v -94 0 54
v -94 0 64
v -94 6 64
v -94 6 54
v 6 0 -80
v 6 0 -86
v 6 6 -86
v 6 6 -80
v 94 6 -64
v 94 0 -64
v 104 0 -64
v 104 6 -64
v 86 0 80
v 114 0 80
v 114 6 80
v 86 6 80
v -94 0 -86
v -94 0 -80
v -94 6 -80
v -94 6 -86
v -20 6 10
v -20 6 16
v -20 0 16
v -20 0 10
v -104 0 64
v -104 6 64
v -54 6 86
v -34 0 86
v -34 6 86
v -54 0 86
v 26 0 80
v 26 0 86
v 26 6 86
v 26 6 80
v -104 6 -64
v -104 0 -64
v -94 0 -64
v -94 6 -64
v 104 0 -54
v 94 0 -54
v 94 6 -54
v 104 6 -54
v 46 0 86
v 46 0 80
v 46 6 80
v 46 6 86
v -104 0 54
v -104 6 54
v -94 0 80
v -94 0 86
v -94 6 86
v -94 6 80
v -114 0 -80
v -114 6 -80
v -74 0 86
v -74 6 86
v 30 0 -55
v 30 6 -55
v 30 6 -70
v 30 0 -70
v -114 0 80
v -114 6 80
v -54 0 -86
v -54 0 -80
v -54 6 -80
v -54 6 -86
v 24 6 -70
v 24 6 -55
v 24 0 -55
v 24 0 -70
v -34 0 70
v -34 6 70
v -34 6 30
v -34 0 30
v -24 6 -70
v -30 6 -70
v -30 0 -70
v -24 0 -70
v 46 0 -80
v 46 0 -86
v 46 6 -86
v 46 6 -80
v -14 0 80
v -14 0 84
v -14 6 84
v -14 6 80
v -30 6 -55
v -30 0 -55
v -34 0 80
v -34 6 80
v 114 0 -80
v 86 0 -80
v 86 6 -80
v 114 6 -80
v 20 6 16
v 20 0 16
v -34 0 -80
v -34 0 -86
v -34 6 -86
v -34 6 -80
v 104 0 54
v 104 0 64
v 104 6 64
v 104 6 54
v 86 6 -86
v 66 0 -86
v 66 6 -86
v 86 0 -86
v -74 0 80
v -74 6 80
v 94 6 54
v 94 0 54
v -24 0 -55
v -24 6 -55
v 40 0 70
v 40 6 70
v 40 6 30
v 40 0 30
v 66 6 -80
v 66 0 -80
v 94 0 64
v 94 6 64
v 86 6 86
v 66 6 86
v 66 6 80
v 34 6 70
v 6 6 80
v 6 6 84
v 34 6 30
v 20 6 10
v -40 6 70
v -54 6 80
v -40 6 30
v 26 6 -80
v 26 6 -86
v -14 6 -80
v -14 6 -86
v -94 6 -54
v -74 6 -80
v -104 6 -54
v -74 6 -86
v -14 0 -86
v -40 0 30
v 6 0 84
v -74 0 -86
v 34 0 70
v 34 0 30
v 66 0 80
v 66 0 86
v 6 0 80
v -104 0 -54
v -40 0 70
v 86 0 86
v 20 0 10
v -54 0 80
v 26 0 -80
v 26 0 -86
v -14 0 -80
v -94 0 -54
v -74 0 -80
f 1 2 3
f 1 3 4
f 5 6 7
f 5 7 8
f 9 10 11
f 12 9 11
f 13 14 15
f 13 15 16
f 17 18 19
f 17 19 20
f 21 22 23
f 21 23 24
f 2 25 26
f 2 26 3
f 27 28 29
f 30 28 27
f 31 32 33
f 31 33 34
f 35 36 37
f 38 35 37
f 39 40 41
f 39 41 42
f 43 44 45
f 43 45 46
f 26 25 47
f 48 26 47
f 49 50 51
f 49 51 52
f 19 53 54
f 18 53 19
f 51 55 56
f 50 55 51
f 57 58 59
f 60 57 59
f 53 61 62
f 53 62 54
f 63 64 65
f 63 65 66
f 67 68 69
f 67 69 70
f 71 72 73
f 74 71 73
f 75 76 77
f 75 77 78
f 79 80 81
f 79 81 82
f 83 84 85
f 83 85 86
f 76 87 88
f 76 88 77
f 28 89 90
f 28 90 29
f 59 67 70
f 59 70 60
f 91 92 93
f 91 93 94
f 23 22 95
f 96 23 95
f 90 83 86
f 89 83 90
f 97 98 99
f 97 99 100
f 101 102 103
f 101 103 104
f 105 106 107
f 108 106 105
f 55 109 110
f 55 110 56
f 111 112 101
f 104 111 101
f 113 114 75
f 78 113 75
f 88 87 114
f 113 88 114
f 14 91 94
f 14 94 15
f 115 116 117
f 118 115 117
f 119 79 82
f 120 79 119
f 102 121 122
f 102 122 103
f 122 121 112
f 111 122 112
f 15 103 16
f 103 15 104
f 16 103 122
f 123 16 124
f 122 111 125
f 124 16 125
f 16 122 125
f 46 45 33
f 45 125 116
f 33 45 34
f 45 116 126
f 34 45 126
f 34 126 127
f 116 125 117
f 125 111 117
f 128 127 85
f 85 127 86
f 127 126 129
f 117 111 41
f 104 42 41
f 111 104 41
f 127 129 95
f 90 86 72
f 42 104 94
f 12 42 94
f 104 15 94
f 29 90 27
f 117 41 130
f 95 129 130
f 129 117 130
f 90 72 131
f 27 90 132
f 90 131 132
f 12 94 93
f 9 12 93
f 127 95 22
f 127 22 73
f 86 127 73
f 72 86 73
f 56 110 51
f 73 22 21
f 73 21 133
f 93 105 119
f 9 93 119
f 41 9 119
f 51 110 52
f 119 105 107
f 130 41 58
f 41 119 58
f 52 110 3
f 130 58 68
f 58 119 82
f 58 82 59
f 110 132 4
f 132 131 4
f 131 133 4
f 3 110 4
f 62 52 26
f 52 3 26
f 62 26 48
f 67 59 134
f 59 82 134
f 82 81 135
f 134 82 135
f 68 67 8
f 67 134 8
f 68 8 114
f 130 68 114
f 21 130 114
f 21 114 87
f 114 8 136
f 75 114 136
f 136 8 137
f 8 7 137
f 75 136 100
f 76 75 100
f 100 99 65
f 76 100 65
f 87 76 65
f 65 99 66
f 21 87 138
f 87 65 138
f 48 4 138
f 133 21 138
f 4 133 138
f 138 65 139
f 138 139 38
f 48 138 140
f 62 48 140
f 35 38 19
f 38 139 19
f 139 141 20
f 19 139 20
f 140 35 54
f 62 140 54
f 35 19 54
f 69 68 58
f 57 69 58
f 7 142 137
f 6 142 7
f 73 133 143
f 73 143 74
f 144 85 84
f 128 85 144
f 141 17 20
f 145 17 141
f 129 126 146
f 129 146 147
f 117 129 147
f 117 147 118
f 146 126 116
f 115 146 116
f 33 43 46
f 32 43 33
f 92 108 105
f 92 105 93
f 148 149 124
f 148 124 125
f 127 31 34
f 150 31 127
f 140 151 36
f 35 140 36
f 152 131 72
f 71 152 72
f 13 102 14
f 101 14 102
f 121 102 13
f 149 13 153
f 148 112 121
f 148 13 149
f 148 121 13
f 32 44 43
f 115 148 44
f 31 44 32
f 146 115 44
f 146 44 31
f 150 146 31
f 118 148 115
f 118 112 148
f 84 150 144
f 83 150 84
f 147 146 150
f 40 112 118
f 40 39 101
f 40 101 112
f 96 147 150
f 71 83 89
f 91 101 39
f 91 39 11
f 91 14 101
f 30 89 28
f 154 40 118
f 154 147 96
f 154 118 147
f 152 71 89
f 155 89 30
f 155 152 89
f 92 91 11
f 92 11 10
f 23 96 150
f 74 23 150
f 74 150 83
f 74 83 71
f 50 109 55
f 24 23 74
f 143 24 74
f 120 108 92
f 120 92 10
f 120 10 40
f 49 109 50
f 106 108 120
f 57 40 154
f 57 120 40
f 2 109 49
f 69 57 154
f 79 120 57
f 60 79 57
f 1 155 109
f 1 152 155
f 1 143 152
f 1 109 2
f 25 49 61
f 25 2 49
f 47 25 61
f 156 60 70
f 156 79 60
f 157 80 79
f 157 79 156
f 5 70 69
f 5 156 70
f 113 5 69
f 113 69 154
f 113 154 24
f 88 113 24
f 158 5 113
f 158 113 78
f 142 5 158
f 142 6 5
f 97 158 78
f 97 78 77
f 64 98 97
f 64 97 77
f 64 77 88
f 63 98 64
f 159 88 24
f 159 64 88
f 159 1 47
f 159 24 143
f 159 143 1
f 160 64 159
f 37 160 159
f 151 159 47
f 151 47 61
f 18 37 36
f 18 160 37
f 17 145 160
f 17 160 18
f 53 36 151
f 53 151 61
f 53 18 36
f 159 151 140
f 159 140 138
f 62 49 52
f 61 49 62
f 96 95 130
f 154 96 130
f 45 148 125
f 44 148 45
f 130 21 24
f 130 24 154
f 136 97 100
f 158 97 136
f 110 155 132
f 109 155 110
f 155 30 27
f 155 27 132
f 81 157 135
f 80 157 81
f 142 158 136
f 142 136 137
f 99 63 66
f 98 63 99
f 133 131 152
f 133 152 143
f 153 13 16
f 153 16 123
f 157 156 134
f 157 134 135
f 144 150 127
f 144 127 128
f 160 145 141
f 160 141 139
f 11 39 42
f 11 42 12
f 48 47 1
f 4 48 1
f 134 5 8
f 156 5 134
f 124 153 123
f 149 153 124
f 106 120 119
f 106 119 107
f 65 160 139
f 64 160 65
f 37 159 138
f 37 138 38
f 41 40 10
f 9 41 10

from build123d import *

# Parameters (mm, degrees)
BOSS_EXTRUDE1_DEPTH = 6
SKETCH2_W           = 10
SKETCH2_H           = 10
CUT_EXTRUDE1_DEPTH  = 6
SKETCH4_W           = 40
SKETCH4_H           = 6
SKETCH4_W_2         = 6
SKETCH4_H_2         = 40
SKETCH4_H_3         = 15
CUT_EXTRUDE2_DEPTH  = 6


with BuildPart() as part:
    # Sketch1 → Boss-Extrude1 (new body)
    with BuildSketch(Plane(origin=(0, 0, 0), x_dir=(1, 0, 0), z_dir=(0, 1, 0))):
        Polygon((-94, 86), (-74, 86), (-74, 80), (-54, 80), (-54, 86), (-34, 86), (-34, 80), (-14, 80), (-14, 86), (6, 86), (6, 80), (26, 80), (26, 86), (46, 86), (46, 80), (66, 80), (66, 86), (86, 86), (86, 80), (114, 80), (114, -80), (86, -80), (86, -86), (66, -86), (66, -80), (46, -80), (46, -86), (26, -86), (26, -80), (6, -80), (6, -86), (-14, -86), (-14, -80), (-34, -80), (-34, -86), (-54, -86), (-54, -80), (-74, -80), (-74, -86), (-94, -86), (-94, -80), (-114, -80), (-114, 80), (-94, 80), align=None)
    extrude(amount=BOSS_EXTRUDE1_DEPTH)

    # Sketch2 → Cut-Extrude1 (cut)
    with BuildSketch(Plane(origin=(0, 0, 0), x_dir=(1, 0, 0), z_dir=(0, 1, 0))):
        with Locations((-99, 59)):
            Rectangle(SKETCH2_W, SKETCH2_H)
        with Locations((99, 59)):
            Rectangle(SKETCH2_W, SKETCH2_H)
        with Locations((99, -59)):
            Rectangle(SKETCH2_W, SKETCH2_H)
        with Locations((-99, -59)):
            Rectangle(SKETCH2_W, SKETCH2_H)
    extrude(amount=CUT_EXTRUDE1_DEPTH, mode=Mode.SUBTRACT)

    # Sketch4 → Cut-Extrude2 (cut)
    with BuildSketch(Plane(origin=(0, 6, 0), x_dir=(1, 0, 0), z_dir=(0, 1, 0))):
        with Locations((0, -13)):
            Rectangle(SKETCH4_W, SKETCH4_H)
        with Locations((0, -87)):
            Rectangle(SKETCH4_W, SKETCH4_H)
        with Locations((-37, -50)):
            Rectangle(SKETCH4_W_2, SKETCH4_H_2)
        with Locations((37, -50)):
            Rectangle(SKETCH4_W_2, SKETCH4_H_2)
        with Locations((-27, 62.5)):
            Rectangle(SKETCH4_W_2, SKETCH4_H_3)
        with Locations((27, 62.5)):
            Rectangle(SKETCH4_W_2, SKETCH4_H_3)
    extrude(amount=-CUT_EXTRUDE2_DEPTH, mode=Mode.SUBTRACT)


solid = part.part
